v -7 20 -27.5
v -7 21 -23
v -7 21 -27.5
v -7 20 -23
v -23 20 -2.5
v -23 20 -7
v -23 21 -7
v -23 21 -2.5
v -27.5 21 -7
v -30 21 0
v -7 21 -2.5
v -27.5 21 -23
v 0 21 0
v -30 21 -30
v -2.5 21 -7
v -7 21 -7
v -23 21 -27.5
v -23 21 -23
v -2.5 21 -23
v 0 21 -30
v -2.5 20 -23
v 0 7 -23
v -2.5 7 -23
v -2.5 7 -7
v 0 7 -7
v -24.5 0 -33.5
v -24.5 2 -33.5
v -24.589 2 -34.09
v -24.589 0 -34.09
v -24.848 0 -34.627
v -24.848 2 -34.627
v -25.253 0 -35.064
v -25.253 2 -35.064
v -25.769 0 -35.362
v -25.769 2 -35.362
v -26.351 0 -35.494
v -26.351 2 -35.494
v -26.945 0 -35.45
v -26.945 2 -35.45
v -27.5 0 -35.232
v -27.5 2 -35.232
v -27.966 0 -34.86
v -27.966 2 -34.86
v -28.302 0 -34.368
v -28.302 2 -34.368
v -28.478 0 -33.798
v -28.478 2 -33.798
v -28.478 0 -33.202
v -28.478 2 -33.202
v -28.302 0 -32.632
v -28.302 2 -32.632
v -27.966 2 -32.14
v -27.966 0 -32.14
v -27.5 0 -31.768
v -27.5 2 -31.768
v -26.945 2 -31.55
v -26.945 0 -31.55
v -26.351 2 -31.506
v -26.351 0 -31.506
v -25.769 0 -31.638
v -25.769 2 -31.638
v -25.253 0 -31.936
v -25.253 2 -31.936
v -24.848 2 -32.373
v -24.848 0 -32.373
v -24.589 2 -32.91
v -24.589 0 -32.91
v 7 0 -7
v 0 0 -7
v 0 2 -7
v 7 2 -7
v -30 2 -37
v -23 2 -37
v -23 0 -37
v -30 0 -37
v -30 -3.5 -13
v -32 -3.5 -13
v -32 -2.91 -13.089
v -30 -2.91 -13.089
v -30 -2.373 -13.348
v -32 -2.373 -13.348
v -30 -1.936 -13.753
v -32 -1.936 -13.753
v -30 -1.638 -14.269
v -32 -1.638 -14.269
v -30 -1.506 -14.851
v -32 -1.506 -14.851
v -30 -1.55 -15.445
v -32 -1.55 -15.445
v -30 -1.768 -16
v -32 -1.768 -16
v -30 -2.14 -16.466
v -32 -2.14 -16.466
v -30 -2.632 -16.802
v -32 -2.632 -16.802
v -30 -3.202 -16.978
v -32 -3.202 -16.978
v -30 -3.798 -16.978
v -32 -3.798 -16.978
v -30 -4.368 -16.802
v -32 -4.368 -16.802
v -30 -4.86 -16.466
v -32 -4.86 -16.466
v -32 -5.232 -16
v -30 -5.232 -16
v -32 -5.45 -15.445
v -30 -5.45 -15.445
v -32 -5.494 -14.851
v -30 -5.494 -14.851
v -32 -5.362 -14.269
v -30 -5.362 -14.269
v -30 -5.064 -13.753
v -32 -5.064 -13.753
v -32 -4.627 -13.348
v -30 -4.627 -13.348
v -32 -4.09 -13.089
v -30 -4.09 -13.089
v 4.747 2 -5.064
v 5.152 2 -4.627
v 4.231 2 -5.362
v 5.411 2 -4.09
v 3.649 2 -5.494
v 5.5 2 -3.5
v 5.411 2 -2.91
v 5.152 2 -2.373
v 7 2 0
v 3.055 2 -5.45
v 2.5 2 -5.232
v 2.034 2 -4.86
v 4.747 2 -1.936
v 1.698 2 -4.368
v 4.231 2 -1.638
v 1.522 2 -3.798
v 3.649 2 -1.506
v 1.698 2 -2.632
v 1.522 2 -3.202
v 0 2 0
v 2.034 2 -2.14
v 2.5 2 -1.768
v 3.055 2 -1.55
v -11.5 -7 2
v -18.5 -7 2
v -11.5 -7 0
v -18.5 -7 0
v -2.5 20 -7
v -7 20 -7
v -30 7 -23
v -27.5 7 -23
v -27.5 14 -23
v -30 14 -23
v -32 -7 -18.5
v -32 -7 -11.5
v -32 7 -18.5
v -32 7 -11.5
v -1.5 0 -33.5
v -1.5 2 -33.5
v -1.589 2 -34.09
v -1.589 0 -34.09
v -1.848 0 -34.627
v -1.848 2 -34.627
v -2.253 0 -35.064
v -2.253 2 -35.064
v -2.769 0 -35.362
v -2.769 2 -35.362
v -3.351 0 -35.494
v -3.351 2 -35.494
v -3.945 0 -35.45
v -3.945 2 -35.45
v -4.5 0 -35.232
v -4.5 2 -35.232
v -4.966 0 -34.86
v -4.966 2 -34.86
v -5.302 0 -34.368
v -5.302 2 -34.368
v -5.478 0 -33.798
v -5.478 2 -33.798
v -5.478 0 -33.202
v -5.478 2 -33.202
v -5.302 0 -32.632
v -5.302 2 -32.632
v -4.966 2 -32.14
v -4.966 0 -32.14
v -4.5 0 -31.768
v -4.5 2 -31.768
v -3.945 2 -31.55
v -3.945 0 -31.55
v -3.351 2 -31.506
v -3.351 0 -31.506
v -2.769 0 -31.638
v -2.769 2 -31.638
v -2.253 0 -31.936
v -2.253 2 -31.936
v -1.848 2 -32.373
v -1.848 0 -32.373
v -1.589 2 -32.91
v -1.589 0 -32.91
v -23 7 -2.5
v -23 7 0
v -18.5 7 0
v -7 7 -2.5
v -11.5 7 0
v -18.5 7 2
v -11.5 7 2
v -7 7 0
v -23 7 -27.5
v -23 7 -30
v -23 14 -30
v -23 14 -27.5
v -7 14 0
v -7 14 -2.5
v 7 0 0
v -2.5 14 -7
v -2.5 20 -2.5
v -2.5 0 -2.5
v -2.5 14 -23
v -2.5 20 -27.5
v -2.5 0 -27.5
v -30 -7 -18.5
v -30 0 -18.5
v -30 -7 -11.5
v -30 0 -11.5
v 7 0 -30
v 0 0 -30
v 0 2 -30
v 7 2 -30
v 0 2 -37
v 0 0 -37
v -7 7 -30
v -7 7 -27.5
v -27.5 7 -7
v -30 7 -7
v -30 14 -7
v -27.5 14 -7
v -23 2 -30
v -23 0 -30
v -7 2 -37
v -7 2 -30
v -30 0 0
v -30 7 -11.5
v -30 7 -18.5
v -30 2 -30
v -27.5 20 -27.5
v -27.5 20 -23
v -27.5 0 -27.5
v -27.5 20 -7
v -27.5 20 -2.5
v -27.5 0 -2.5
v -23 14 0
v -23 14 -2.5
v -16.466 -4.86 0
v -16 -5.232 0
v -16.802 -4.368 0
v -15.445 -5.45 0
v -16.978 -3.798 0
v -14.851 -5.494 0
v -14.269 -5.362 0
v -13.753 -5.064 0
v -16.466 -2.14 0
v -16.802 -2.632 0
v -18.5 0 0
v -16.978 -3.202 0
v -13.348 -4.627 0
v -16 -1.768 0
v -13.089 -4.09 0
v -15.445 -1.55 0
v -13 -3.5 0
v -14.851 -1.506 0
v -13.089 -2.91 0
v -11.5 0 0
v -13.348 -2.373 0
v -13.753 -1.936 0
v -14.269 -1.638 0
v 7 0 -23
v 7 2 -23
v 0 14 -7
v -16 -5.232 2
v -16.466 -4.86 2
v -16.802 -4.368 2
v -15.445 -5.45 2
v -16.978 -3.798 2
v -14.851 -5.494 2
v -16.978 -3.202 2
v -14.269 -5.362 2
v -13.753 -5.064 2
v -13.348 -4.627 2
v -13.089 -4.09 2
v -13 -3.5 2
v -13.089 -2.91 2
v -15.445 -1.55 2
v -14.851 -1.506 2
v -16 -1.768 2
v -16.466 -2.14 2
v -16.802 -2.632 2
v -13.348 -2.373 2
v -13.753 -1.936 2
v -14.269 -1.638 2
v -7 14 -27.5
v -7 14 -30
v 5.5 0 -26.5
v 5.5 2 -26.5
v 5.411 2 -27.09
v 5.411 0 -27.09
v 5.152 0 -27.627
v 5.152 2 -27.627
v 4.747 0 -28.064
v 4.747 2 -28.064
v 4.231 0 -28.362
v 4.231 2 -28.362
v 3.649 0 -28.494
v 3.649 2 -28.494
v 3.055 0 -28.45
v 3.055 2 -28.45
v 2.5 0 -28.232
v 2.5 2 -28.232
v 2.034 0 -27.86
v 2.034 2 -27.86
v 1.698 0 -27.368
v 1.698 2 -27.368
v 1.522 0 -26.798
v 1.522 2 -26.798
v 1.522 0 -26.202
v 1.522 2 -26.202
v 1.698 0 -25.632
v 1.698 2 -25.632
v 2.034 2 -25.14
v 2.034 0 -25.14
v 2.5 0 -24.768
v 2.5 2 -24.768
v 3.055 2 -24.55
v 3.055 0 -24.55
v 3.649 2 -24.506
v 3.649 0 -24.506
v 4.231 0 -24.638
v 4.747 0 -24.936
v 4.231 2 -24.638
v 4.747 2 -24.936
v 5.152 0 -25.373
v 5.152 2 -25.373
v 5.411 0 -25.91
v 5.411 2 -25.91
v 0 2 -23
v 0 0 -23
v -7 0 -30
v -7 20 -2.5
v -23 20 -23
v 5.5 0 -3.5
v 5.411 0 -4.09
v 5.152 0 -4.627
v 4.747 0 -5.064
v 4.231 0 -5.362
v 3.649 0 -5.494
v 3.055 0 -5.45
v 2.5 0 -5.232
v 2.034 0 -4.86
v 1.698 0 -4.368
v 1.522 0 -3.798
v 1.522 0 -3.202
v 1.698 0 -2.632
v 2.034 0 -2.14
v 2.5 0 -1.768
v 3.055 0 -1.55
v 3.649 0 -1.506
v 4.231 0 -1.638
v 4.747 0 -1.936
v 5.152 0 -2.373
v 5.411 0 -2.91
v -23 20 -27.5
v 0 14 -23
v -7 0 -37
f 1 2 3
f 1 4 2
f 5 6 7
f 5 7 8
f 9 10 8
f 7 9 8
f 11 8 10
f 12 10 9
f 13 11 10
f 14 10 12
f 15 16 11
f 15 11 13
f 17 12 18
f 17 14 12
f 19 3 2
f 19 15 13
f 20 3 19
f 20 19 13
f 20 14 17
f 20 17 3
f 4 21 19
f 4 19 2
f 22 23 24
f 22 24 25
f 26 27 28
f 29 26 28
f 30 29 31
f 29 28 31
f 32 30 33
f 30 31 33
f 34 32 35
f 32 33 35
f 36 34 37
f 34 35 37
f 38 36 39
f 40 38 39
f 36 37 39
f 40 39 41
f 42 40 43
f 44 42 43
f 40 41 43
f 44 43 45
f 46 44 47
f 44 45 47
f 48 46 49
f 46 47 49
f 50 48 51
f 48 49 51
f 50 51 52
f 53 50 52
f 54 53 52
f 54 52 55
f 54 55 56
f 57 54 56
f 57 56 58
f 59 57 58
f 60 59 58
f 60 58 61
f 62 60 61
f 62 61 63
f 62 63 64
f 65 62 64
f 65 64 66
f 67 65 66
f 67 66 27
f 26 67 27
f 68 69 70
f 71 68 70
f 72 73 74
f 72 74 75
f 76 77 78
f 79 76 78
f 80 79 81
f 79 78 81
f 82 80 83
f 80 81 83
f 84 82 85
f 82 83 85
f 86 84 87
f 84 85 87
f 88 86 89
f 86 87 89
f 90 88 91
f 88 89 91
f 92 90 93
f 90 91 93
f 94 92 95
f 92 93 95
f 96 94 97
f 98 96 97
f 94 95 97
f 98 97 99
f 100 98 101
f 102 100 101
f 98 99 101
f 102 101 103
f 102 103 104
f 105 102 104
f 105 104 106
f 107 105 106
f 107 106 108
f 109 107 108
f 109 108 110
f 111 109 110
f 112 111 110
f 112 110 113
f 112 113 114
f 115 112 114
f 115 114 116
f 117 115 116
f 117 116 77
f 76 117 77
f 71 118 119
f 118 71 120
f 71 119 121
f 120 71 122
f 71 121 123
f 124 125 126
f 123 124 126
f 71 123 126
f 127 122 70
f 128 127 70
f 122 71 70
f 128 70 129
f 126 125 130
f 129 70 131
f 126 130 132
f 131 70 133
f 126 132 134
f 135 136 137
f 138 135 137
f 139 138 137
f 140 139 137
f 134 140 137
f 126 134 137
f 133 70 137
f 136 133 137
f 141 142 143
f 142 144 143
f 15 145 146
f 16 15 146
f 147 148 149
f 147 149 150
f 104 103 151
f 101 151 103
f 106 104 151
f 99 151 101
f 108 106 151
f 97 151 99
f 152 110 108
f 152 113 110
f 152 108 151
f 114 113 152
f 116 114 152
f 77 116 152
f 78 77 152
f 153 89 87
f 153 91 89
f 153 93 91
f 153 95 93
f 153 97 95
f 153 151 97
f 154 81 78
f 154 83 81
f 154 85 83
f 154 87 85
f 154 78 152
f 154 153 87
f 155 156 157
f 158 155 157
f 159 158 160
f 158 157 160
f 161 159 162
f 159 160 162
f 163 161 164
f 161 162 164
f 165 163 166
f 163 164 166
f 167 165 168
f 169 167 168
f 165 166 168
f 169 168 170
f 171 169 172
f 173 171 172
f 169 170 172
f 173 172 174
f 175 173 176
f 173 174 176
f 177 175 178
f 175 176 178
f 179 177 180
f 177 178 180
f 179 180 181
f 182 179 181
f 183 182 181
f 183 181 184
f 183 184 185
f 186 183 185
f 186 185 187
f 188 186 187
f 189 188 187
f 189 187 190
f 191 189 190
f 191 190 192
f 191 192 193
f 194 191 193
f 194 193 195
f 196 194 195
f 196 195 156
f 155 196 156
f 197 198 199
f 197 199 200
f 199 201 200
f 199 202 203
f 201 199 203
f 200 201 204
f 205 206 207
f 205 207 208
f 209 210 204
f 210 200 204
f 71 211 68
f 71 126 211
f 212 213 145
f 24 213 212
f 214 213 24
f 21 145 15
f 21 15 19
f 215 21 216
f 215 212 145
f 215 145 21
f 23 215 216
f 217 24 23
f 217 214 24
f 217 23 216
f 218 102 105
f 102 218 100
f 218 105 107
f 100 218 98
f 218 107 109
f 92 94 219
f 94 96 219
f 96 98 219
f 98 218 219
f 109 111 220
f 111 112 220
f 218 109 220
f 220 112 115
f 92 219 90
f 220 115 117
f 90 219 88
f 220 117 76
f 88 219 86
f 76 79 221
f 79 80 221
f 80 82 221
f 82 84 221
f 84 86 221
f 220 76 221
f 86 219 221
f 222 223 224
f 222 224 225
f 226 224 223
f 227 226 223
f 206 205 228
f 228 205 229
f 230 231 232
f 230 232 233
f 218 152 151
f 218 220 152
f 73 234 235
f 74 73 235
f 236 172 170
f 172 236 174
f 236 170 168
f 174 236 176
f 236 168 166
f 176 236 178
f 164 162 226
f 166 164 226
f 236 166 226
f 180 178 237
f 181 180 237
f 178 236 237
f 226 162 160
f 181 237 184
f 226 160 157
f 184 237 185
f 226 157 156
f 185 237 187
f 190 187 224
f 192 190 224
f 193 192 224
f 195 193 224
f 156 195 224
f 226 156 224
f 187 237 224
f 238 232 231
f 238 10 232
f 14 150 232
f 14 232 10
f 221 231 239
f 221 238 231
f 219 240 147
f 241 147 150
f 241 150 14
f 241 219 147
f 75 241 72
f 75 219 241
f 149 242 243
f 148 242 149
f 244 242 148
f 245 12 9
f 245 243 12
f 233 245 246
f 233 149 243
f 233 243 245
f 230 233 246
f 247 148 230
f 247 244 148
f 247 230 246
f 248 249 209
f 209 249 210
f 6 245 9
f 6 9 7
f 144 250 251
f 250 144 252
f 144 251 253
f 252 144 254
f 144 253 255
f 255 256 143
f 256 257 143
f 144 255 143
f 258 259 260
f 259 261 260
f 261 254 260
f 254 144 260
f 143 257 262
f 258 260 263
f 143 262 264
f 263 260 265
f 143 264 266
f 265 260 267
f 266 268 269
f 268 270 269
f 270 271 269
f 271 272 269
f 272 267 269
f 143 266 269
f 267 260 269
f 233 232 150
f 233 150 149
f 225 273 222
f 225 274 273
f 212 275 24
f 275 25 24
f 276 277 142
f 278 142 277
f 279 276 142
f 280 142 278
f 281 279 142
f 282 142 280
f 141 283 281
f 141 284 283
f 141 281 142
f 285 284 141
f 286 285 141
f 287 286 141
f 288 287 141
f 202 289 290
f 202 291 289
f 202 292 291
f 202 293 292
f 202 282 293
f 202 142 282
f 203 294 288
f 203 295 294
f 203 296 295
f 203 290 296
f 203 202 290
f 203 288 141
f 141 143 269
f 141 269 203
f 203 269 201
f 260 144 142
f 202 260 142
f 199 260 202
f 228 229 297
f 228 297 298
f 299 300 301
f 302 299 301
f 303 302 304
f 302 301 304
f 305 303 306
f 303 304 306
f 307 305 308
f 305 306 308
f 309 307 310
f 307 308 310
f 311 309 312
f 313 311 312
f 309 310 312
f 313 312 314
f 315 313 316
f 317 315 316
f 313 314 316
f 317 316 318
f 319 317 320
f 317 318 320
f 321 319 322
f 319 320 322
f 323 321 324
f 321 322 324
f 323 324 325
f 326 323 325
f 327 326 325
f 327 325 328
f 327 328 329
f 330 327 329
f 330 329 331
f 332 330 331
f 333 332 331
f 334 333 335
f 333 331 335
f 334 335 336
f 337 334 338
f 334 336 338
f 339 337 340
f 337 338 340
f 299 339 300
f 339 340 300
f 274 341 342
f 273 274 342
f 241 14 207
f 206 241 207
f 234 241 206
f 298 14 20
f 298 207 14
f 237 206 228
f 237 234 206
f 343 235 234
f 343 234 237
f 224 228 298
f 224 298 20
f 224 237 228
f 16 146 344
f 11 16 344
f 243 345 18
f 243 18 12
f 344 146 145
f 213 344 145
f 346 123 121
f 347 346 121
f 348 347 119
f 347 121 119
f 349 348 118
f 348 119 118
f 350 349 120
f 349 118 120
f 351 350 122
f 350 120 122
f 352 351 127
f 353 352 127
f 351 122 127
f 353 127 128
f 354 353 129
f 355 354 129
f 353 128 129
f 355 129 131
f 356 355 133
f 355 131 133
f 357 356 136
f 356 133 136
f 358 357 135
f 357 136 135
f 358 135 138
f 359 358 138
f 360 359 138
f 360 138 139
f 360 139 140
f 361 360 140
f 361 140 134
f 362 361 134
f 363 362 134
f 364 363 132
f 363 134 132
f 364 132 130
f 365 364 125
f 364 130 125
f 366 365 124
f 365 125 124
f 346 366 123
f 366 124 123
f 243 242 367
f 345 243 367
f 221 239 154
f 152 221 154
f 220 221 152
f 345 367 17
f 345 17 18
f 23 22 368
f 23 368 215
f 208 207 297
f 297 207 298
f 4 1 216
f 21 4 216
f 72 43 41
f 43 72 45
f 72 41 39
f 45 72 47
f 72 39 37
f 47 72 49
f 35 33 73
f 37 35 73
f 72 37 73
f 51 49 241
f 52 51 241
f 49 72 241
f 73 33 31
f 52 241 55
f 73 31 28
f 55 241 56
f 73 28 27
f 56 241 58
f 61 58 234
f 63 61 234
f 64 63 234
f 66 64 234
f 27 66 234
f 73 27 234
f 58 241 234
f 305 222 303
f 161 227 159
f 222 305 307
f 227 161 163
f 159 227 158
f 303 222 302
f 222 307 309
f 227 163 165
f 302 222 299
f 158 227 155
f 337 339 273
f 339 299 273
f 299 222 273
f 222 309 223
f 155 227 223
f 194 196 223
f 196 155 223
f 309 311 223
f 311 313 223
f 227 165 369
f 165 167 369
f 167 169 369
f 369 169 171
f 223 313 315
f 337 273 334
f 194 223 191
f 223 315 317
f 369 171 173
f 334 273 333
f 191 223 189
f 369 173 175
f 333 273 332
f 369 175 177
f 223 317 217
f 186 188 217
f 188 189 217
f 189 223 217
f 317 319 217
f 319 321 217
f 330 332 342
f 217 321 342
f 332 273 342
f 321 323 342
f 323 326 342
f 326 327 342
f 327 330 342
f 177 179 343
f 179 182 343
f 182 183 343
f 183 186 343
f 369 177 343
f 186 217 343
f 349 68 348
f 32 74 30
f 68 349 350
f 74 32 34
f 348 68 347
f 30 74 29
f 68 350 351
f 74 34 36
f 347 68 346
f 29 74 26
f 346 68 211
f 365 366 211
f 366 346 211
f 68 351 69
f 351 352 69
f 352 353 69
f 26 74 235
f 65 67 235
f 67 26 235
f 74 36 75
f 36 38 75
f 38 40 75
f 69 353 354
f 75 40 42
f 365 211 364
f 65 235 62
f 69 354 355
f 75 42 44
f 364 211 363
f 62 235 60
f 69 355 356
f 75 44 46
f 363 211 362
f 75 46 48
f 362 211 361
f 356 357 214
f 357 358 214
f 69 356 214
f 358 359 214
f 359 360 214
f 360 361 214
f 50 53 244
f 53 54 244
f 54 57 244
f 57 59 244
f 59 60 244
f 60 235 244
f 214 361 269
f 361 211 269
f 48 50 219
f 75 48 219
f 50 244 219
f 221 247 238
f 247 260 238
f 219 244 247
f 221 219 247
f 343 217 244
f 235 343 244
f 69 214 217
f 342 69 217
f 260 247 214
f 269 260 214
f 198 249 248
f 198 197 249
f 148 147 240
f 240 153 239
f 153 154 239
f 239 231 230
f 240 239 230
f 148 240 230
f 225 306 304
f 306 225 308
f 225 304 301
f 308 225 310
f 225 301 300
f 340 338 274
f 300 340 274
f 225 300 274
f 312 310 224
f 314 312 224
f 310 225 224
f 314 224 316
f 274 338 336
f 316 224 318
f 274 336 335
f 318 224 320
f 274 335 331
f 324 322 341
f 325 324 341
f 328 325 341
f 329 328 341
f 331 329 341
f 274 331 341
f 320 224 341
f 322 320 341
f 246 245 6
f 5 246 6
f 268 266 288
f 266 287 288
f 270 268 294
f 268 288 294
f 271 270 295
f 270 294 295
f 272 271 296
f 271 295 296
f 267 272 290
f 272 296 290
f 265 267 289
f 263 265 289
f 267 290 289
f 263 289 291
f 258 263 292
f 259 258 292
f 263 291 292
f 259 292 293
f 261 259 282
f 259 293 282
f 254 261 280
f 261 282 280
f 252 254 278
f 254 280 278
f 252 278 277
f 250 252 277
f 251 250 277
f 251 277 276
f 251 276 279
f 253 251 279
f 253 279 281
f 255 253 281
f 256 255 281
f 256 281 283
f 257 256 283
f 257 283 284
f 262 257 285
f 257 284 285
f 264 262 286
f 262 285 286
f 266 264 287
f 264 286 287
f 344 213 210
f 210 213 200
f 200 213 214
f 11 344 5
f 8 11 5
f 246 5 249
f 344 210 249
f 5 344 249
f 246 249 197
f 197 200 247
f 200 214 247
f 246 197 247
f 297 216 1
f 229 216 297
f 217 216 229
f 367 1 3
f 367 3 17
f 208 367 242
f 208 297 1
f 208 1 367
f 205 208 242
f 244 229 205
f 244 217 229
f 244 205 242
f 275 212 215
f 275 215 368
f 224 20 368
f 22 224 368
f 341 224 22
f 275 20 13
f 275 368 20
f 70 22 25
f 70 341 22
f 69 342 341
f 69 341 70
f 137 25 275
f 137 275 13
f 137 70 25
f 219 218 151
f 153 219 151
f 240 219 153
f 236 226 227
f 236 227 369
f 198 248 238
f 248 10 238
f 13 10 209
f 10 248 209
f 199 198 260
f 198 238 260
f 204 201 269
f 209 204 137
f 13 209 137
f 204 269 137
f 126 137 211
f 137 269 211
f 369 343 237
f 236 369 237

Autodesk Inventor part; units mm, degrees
ref_plane "YZ Plane" through (0, 0, 0) normal (1, 0, 0) x (0, 1, 0)
ref_plane "XZ Plane" through (0, 0, 0) normal (0, 1, 0) x (-1, 0, 0)
ref_plane "XY Plane" through (0, 0, 0) normal (0, 0, 1) x (1, 0, 0)
sketch "Sketch1" plane through (0, 0, 0) normal (0, 1, 0) x (-1, 0, 0)
  line L0 (0, 0) -> (0, -7)
  line L1 (0, -7) -> (2.5, -7)
  line L2 (2.5, -7) -> (2.5, -2.5)
  line L3 (2.5, -2.5) -> (7, -2.5)
  line L4 (7, -2.5) -> (7, 0)
  line L5 (7, 0) -> (0, 0)
  line L6 (0, -30) -> (0, -23)
  line L7 (0, -23) -> (2.5, -23)
  line L8 (2.5, -23) -> (2.5, -27.5)
  line L9 (2.5, -27.5) -> (7, -27.5)
  line L10 (7, -27.5) -> (7, -30)
  line L11 (7, -30) -> (0, -30)
  line L12 (23, 0) -> (30, 0)
  line L13 (30, 0) -> (30, -7)
  line L14 (30, -7) -> (27.5, -7)
  line L15 (27.5, -7) -> (27.5, -2.5)
  line L16 (27.5, -2.5) -> (23, -2.5)
  line L17 (23, -2.5) -> (23, 0)
  line L18 (30, -23) -> (30, -30)
  line L19 (30, -30) -> (23, -30)
  line L20 (23, -30) -> (23, -27.5)
  line L21 (23, -27.5) -> (27.5, -27.5)
  line L22 (27.5, -27.5) -> (27.5, -23)
  line L23 (27.5, -23) -> (30, -23)
  dimension "d0" = 7
  dimension "d1" = 2.5
  dimension "d2" = 4.5
  dimension "d3" = 4.5
  dimension "d8" = 7
  dimension "d9" = 4.5
  dimension "d10" = 7
  dimension "d11" = 7
  dimension "d12" = 2.5
  dimension "d13" = 30
  dimension "d14" = 30
  dimension "d15" = 30
  dimension "d16" = 2.5
  dimension "d17" = 2.5
  dimension "d18" = 4.5
  dimension "d19" = 7
extrude "Extrusion1" add sketch "Sketch1" along normal blind 20
sketch "Sketch2" plane through (0, 0, 0) normal (0, -1, 0) x (1, 0, 0)
  line L0 (0, 0) -> (-30, 0)
  line L1 (-30, 0) -> (-30, -30)
  line L2 (-30, -30) -> (0, -30)
  line L3 (0, -30) -> (0, 0)
  line L4 (-27.5, -2.5) -> (-2.5, -2.5)
  line L5 (-2.5, -2.5) -> (-2.5, -27.5)
  line L6 (-2.5, -27.5) -> (-27.5, -27.5)
  line L7 (-27.5, -27.5) -> (-23, -27.5) projected
  line L8 (-27.5, -27.5) -> (-27.5, -2.5)
extrude "Extrusion2" add sketch "Sketch2" against normal blind 7
sketch "Sketch3" plane through (0, 20, 0) normal (0, 1, 0) x (1, 0, 0)
  line L0 (0, 0) -> (-7, 0)
  line L1 (0, 0) -> (-30, 0) projected
  line L2 (-7, 0) -> (-7, 7)
  line L3 (-7, 7) -> (0, 7)
  line L4 (0, 7) -> (0, 0)
  line L5 (0, 30) -> (-7, 30)
  line L6 (-7, 30) -> (-7, 23)
  line L7 (-7, 23) -> (0, 23)
  line L8 (-2.5, 23) -> (0, 23) projected
  line L9 (0, 23) -> (0, 30)
  line L10 (0, 23) -> (0, 30) projected
  line L11 (-30, 30) -> (-30, 23)
  line L12 (-30, 0) -> (-30, 30) projected
  line L13 (-30, 23) -> (-23, 23)
  line L14 (-23, 23) -> (-23, 30)
  line L15 (-23, 30) -> (-30, 30)
  line L16 (-30, 30) -> (0, 30) projected
  line L17 (-30, 0) -> (-23, 0)
  line L18 (-23, 0) -> (-23, 7)
  line L19 (-23, 7) -> (-30, 7)
  line L20 (-27.5, 7) -> (-30, 7) projected
  line L21 (-30, 7) -> (-30, 0)
  dimension "d24" = 7
  dimension "d25" = 7
  dimension "d26" = 7
  dimension "d27" = 7
  dimension "d28" = 7
extrude "Extrusion3" add sketch "Sketch3" along normal blind 1
sketch "Sketch4" plane through (0, 0, 0) normal (1, 0, 0) x (0, 0, -1)
  line L0 (0, 0) -> (7, 0)
  line L1 (27.5, 0) -> (2.5, 0) projected
  line L2 (7, 0) -> (7, 2)
  line L3 (7, 2) -> (0, 2)
  line L4 (0, 2) -> (0, 0)
  line L5 (30, 0) -> (30, 2)
  line L6 (30, 0) -> (30, 21) projected
  line L7 (30, 2) -> (23, 2)
  line L8 (23, 2) -> (23, 0)
  line L9 (0, 0) -> (30, 0) projected
  line L10 (23, 0) -> (30, 0)
  dimension "d31" = 7
  dimension "d32" = 2
  dimension "d33" = 2
  dimension "d34" = 7
sketch "Sketch5" plane through (0, 0, -30) normal (0, 0, -1) x (-1, 0, 0)
  line L0 (0, 0) -> (7, 0)
  line L1 (7, 0) -> (7, 2)
  line L2 (7, 2) -> (0, 2)
  line L3 (0, 2) -> (0, 0)
  line L4 (30, 0) -> (30, 2)
  line L5 (30, 0) -> (30, 21) projected
  line L6 (30, 2) -> (23, 2)
  line L7 (23, 2) -> (23, 0)
  line L8 (23, 0) -> (30, 0)
  line L9 (30, 0) -> (0, 0) projected
  dimension "d35" = 7
  dimension "d36" = 2
  dimension "d37" = 2
  dimension "d38" = 7
extrude "Extrusion4" add sketch "Sketch4" along normal blind 7
extrude "Extrusion5" add sketch "Sketch5" along normal blind 7
sketch "Sketch6" plane through (0, 2, 0) normal (0, 1, 0) x (1, 0, 0)
  circle A0 centre (3.5, 3.5) radius 2
  line L0 (7, 7) -> (7, 0) projected
  line L1 (0, 0) -> (7, 0) projected
  point P0 (7, 3.5)
  point P1 (3.5, 0)
  dimension "d43" = 4
sketch "Sketch7" plane through (0, 2, -23) normal (0, 1, 0) x (1, 0, 0)
  circle A0 centre (3.5, 3.5) radius 2
  line L0 (7, 7) -> (7, 0) projected
  line L1 (0, 0) -> (7, 0) projected
  point P0 (0, -23)
  point P1 (7, 3.5)
  point P2 (3.5, 0)
  dimension "d44" = 4
sketch "Sketch8" plane through (-7, 2, -30) normal (0, 1, 0) x (1, 0, 0)
  circle A0 centre (3.5, 3.5) radius 2
  circle A1 centre (-19.5, 3.5) radius 2
  line L0 (7, 0) -> (7, 7) projected
  line L1 (7, 0) -> (0, 0) projected
  line L2 (-23, 0) -> (-23, 7) projected
  line L3 (-23, 7) -> (-16, 7) projected
  point P0 (7, -30)
  point P1 (7, 3.5)
  point P2 (3.5, 0)
  point P3 (-23, 3.5)
  point P4 (-19.5, 7)
  dimension "d45" = 4
  dimension "d46" = 4
extrude "Extrusion6" cut sketch "Sketch6" against normal blind 2
extrude "Extrusion7" cut sketch "Sketch7" against normal blind 2
extrude "Extrusion8" cut sketch "Sketch8" against normal blind 2
sketch "Sketch9" plane through (0, 21, 0) normal (0, 1, 0) x (1, 0, 0)
  line L0 (0, 30) -> (0, 0)
  line L1 (0, 0) -> (-30, 0)
  line L2 (7, 0) -> (-30, 0) projected
  line L3 (-30, 0) -> (-30, 30)
  line L4 (-30, 0) -> (-30, 37) projected
  line L5 (0, 30) -> (-30, 30)
  line L6 (-2.5, 27.5) -> (-27.5, 27.5)
  line L7 (-2.5, 27.5) -> (-27.5, 27.5) projected
  line L8 (-27.5, 27.5) -> (-27.5, 2.5)
  line L9 (-27.5, 2.5) -> (-2.5, 2.5)
  line L10 (-27.5, 2.5) -> (-2.5, 2.5) projected
  line L11 (-2.5, 2.5) -> (-2.5, 27.5)
extrude "Extrusion9" add sketch "Sketch9" against normal blind 7
sketch "Sketch10" plane through (-30, 0, 0) normal (-1, 0, 0) x (0, 0, 1)
  line L0 (0, 0) -> (-11.5, 0)
  line L1 (-2.5, 0) -> (-27.5, 0) projected
  line L2 (-11.5, 0) -> (-11.5, -7)
  line L3 (-11.5, -7) -> (-18.5, -7)
  line L4 (-18.5, -7) -> (-18.5, 0)
  line L5 (-18.5, 0) -> (-18.5, 7)
  line L6 (-23, 7) -> (-7, 7) projected
  line L7 (-18.5, 7) -> (-11.5, 7)
  line L8 (-11.5, 0) -> (-11.5, 7)
  dimension "d55" = 11.5
  dimension "d56" = 7
  dimension "d57" = 7
  dimension "d58" = 7
extrude "Extrusion10" add sketch "Sketch10" along normal blind 2
sketch "Sketch11" plane through (-30, 21, 0) normal (0, 0, 1) x (1, 0, 0)
  line L0 (0, -21) -> (11.5, -21)
  line L1 (7, -21) -> (23, -21) projected
  line L2 (11.5, -21) -> (18.5, -21)
  line L3 (18.5, -21) -> (18.5, -14)
  line L4 (7, -14) -> (23, -14) projected
  line L5 (18.5, -14) -> (11.5, -14)
  line L6 (11.5, -21) -> (11.5, -14)
  line L7 (11.5, -21) -> (11.5, -28)
  line L8 (11.5, -28) -> (18.5, -28)
  line L9 (18.5, -28) -> (18.5, -21)
  point P0 (30, -21)
  dimension "d61" = 11.5
  dimension "d62" = 7
  dimension "d63" = 7
extrude "Extrusion11" add sketch "Sketch11" along normal blind 2
sketch "Sketch12" plane through (-30, 21, 2) normal (0, 0, 1) x (1, 0, 0)
  circle A0 centre (15, -24.5) radius 2
  line L0 (18.5, -28) -> (18.5, -21) projected
  line L1 (11.5, -28) -> (18.5, -28) projected
  point P0 (30, -21)
  point P1 (18.5, -24.5)
  point P2 (15, -28)
  dimension "d66" = 4
sketch "Sketch13" plane through (-32, 0, 0) normal (-1, 0, 0) x (0, 0, 1)
  circle A0 centre (-15, -3.5) radius 2
  line L0 (-11.5, -7) -> (-11.5, 0) projected
  line L1 (-18.5, -7) -> (-11.5, -7) projected
  point P0 (0, 0)
  point P1 (-11.5, -3.5)
  point P2 (-15, -7)
  dimension "d67" = 4
extrude "Extrusion12" cut sketch "Sketch13" against normal blind 2
extrude "Extrusion13" cut sketch "Sketch12" against normal blind 2
properties part number "ygolki" material "Nylon, molybdenum disulphide"
